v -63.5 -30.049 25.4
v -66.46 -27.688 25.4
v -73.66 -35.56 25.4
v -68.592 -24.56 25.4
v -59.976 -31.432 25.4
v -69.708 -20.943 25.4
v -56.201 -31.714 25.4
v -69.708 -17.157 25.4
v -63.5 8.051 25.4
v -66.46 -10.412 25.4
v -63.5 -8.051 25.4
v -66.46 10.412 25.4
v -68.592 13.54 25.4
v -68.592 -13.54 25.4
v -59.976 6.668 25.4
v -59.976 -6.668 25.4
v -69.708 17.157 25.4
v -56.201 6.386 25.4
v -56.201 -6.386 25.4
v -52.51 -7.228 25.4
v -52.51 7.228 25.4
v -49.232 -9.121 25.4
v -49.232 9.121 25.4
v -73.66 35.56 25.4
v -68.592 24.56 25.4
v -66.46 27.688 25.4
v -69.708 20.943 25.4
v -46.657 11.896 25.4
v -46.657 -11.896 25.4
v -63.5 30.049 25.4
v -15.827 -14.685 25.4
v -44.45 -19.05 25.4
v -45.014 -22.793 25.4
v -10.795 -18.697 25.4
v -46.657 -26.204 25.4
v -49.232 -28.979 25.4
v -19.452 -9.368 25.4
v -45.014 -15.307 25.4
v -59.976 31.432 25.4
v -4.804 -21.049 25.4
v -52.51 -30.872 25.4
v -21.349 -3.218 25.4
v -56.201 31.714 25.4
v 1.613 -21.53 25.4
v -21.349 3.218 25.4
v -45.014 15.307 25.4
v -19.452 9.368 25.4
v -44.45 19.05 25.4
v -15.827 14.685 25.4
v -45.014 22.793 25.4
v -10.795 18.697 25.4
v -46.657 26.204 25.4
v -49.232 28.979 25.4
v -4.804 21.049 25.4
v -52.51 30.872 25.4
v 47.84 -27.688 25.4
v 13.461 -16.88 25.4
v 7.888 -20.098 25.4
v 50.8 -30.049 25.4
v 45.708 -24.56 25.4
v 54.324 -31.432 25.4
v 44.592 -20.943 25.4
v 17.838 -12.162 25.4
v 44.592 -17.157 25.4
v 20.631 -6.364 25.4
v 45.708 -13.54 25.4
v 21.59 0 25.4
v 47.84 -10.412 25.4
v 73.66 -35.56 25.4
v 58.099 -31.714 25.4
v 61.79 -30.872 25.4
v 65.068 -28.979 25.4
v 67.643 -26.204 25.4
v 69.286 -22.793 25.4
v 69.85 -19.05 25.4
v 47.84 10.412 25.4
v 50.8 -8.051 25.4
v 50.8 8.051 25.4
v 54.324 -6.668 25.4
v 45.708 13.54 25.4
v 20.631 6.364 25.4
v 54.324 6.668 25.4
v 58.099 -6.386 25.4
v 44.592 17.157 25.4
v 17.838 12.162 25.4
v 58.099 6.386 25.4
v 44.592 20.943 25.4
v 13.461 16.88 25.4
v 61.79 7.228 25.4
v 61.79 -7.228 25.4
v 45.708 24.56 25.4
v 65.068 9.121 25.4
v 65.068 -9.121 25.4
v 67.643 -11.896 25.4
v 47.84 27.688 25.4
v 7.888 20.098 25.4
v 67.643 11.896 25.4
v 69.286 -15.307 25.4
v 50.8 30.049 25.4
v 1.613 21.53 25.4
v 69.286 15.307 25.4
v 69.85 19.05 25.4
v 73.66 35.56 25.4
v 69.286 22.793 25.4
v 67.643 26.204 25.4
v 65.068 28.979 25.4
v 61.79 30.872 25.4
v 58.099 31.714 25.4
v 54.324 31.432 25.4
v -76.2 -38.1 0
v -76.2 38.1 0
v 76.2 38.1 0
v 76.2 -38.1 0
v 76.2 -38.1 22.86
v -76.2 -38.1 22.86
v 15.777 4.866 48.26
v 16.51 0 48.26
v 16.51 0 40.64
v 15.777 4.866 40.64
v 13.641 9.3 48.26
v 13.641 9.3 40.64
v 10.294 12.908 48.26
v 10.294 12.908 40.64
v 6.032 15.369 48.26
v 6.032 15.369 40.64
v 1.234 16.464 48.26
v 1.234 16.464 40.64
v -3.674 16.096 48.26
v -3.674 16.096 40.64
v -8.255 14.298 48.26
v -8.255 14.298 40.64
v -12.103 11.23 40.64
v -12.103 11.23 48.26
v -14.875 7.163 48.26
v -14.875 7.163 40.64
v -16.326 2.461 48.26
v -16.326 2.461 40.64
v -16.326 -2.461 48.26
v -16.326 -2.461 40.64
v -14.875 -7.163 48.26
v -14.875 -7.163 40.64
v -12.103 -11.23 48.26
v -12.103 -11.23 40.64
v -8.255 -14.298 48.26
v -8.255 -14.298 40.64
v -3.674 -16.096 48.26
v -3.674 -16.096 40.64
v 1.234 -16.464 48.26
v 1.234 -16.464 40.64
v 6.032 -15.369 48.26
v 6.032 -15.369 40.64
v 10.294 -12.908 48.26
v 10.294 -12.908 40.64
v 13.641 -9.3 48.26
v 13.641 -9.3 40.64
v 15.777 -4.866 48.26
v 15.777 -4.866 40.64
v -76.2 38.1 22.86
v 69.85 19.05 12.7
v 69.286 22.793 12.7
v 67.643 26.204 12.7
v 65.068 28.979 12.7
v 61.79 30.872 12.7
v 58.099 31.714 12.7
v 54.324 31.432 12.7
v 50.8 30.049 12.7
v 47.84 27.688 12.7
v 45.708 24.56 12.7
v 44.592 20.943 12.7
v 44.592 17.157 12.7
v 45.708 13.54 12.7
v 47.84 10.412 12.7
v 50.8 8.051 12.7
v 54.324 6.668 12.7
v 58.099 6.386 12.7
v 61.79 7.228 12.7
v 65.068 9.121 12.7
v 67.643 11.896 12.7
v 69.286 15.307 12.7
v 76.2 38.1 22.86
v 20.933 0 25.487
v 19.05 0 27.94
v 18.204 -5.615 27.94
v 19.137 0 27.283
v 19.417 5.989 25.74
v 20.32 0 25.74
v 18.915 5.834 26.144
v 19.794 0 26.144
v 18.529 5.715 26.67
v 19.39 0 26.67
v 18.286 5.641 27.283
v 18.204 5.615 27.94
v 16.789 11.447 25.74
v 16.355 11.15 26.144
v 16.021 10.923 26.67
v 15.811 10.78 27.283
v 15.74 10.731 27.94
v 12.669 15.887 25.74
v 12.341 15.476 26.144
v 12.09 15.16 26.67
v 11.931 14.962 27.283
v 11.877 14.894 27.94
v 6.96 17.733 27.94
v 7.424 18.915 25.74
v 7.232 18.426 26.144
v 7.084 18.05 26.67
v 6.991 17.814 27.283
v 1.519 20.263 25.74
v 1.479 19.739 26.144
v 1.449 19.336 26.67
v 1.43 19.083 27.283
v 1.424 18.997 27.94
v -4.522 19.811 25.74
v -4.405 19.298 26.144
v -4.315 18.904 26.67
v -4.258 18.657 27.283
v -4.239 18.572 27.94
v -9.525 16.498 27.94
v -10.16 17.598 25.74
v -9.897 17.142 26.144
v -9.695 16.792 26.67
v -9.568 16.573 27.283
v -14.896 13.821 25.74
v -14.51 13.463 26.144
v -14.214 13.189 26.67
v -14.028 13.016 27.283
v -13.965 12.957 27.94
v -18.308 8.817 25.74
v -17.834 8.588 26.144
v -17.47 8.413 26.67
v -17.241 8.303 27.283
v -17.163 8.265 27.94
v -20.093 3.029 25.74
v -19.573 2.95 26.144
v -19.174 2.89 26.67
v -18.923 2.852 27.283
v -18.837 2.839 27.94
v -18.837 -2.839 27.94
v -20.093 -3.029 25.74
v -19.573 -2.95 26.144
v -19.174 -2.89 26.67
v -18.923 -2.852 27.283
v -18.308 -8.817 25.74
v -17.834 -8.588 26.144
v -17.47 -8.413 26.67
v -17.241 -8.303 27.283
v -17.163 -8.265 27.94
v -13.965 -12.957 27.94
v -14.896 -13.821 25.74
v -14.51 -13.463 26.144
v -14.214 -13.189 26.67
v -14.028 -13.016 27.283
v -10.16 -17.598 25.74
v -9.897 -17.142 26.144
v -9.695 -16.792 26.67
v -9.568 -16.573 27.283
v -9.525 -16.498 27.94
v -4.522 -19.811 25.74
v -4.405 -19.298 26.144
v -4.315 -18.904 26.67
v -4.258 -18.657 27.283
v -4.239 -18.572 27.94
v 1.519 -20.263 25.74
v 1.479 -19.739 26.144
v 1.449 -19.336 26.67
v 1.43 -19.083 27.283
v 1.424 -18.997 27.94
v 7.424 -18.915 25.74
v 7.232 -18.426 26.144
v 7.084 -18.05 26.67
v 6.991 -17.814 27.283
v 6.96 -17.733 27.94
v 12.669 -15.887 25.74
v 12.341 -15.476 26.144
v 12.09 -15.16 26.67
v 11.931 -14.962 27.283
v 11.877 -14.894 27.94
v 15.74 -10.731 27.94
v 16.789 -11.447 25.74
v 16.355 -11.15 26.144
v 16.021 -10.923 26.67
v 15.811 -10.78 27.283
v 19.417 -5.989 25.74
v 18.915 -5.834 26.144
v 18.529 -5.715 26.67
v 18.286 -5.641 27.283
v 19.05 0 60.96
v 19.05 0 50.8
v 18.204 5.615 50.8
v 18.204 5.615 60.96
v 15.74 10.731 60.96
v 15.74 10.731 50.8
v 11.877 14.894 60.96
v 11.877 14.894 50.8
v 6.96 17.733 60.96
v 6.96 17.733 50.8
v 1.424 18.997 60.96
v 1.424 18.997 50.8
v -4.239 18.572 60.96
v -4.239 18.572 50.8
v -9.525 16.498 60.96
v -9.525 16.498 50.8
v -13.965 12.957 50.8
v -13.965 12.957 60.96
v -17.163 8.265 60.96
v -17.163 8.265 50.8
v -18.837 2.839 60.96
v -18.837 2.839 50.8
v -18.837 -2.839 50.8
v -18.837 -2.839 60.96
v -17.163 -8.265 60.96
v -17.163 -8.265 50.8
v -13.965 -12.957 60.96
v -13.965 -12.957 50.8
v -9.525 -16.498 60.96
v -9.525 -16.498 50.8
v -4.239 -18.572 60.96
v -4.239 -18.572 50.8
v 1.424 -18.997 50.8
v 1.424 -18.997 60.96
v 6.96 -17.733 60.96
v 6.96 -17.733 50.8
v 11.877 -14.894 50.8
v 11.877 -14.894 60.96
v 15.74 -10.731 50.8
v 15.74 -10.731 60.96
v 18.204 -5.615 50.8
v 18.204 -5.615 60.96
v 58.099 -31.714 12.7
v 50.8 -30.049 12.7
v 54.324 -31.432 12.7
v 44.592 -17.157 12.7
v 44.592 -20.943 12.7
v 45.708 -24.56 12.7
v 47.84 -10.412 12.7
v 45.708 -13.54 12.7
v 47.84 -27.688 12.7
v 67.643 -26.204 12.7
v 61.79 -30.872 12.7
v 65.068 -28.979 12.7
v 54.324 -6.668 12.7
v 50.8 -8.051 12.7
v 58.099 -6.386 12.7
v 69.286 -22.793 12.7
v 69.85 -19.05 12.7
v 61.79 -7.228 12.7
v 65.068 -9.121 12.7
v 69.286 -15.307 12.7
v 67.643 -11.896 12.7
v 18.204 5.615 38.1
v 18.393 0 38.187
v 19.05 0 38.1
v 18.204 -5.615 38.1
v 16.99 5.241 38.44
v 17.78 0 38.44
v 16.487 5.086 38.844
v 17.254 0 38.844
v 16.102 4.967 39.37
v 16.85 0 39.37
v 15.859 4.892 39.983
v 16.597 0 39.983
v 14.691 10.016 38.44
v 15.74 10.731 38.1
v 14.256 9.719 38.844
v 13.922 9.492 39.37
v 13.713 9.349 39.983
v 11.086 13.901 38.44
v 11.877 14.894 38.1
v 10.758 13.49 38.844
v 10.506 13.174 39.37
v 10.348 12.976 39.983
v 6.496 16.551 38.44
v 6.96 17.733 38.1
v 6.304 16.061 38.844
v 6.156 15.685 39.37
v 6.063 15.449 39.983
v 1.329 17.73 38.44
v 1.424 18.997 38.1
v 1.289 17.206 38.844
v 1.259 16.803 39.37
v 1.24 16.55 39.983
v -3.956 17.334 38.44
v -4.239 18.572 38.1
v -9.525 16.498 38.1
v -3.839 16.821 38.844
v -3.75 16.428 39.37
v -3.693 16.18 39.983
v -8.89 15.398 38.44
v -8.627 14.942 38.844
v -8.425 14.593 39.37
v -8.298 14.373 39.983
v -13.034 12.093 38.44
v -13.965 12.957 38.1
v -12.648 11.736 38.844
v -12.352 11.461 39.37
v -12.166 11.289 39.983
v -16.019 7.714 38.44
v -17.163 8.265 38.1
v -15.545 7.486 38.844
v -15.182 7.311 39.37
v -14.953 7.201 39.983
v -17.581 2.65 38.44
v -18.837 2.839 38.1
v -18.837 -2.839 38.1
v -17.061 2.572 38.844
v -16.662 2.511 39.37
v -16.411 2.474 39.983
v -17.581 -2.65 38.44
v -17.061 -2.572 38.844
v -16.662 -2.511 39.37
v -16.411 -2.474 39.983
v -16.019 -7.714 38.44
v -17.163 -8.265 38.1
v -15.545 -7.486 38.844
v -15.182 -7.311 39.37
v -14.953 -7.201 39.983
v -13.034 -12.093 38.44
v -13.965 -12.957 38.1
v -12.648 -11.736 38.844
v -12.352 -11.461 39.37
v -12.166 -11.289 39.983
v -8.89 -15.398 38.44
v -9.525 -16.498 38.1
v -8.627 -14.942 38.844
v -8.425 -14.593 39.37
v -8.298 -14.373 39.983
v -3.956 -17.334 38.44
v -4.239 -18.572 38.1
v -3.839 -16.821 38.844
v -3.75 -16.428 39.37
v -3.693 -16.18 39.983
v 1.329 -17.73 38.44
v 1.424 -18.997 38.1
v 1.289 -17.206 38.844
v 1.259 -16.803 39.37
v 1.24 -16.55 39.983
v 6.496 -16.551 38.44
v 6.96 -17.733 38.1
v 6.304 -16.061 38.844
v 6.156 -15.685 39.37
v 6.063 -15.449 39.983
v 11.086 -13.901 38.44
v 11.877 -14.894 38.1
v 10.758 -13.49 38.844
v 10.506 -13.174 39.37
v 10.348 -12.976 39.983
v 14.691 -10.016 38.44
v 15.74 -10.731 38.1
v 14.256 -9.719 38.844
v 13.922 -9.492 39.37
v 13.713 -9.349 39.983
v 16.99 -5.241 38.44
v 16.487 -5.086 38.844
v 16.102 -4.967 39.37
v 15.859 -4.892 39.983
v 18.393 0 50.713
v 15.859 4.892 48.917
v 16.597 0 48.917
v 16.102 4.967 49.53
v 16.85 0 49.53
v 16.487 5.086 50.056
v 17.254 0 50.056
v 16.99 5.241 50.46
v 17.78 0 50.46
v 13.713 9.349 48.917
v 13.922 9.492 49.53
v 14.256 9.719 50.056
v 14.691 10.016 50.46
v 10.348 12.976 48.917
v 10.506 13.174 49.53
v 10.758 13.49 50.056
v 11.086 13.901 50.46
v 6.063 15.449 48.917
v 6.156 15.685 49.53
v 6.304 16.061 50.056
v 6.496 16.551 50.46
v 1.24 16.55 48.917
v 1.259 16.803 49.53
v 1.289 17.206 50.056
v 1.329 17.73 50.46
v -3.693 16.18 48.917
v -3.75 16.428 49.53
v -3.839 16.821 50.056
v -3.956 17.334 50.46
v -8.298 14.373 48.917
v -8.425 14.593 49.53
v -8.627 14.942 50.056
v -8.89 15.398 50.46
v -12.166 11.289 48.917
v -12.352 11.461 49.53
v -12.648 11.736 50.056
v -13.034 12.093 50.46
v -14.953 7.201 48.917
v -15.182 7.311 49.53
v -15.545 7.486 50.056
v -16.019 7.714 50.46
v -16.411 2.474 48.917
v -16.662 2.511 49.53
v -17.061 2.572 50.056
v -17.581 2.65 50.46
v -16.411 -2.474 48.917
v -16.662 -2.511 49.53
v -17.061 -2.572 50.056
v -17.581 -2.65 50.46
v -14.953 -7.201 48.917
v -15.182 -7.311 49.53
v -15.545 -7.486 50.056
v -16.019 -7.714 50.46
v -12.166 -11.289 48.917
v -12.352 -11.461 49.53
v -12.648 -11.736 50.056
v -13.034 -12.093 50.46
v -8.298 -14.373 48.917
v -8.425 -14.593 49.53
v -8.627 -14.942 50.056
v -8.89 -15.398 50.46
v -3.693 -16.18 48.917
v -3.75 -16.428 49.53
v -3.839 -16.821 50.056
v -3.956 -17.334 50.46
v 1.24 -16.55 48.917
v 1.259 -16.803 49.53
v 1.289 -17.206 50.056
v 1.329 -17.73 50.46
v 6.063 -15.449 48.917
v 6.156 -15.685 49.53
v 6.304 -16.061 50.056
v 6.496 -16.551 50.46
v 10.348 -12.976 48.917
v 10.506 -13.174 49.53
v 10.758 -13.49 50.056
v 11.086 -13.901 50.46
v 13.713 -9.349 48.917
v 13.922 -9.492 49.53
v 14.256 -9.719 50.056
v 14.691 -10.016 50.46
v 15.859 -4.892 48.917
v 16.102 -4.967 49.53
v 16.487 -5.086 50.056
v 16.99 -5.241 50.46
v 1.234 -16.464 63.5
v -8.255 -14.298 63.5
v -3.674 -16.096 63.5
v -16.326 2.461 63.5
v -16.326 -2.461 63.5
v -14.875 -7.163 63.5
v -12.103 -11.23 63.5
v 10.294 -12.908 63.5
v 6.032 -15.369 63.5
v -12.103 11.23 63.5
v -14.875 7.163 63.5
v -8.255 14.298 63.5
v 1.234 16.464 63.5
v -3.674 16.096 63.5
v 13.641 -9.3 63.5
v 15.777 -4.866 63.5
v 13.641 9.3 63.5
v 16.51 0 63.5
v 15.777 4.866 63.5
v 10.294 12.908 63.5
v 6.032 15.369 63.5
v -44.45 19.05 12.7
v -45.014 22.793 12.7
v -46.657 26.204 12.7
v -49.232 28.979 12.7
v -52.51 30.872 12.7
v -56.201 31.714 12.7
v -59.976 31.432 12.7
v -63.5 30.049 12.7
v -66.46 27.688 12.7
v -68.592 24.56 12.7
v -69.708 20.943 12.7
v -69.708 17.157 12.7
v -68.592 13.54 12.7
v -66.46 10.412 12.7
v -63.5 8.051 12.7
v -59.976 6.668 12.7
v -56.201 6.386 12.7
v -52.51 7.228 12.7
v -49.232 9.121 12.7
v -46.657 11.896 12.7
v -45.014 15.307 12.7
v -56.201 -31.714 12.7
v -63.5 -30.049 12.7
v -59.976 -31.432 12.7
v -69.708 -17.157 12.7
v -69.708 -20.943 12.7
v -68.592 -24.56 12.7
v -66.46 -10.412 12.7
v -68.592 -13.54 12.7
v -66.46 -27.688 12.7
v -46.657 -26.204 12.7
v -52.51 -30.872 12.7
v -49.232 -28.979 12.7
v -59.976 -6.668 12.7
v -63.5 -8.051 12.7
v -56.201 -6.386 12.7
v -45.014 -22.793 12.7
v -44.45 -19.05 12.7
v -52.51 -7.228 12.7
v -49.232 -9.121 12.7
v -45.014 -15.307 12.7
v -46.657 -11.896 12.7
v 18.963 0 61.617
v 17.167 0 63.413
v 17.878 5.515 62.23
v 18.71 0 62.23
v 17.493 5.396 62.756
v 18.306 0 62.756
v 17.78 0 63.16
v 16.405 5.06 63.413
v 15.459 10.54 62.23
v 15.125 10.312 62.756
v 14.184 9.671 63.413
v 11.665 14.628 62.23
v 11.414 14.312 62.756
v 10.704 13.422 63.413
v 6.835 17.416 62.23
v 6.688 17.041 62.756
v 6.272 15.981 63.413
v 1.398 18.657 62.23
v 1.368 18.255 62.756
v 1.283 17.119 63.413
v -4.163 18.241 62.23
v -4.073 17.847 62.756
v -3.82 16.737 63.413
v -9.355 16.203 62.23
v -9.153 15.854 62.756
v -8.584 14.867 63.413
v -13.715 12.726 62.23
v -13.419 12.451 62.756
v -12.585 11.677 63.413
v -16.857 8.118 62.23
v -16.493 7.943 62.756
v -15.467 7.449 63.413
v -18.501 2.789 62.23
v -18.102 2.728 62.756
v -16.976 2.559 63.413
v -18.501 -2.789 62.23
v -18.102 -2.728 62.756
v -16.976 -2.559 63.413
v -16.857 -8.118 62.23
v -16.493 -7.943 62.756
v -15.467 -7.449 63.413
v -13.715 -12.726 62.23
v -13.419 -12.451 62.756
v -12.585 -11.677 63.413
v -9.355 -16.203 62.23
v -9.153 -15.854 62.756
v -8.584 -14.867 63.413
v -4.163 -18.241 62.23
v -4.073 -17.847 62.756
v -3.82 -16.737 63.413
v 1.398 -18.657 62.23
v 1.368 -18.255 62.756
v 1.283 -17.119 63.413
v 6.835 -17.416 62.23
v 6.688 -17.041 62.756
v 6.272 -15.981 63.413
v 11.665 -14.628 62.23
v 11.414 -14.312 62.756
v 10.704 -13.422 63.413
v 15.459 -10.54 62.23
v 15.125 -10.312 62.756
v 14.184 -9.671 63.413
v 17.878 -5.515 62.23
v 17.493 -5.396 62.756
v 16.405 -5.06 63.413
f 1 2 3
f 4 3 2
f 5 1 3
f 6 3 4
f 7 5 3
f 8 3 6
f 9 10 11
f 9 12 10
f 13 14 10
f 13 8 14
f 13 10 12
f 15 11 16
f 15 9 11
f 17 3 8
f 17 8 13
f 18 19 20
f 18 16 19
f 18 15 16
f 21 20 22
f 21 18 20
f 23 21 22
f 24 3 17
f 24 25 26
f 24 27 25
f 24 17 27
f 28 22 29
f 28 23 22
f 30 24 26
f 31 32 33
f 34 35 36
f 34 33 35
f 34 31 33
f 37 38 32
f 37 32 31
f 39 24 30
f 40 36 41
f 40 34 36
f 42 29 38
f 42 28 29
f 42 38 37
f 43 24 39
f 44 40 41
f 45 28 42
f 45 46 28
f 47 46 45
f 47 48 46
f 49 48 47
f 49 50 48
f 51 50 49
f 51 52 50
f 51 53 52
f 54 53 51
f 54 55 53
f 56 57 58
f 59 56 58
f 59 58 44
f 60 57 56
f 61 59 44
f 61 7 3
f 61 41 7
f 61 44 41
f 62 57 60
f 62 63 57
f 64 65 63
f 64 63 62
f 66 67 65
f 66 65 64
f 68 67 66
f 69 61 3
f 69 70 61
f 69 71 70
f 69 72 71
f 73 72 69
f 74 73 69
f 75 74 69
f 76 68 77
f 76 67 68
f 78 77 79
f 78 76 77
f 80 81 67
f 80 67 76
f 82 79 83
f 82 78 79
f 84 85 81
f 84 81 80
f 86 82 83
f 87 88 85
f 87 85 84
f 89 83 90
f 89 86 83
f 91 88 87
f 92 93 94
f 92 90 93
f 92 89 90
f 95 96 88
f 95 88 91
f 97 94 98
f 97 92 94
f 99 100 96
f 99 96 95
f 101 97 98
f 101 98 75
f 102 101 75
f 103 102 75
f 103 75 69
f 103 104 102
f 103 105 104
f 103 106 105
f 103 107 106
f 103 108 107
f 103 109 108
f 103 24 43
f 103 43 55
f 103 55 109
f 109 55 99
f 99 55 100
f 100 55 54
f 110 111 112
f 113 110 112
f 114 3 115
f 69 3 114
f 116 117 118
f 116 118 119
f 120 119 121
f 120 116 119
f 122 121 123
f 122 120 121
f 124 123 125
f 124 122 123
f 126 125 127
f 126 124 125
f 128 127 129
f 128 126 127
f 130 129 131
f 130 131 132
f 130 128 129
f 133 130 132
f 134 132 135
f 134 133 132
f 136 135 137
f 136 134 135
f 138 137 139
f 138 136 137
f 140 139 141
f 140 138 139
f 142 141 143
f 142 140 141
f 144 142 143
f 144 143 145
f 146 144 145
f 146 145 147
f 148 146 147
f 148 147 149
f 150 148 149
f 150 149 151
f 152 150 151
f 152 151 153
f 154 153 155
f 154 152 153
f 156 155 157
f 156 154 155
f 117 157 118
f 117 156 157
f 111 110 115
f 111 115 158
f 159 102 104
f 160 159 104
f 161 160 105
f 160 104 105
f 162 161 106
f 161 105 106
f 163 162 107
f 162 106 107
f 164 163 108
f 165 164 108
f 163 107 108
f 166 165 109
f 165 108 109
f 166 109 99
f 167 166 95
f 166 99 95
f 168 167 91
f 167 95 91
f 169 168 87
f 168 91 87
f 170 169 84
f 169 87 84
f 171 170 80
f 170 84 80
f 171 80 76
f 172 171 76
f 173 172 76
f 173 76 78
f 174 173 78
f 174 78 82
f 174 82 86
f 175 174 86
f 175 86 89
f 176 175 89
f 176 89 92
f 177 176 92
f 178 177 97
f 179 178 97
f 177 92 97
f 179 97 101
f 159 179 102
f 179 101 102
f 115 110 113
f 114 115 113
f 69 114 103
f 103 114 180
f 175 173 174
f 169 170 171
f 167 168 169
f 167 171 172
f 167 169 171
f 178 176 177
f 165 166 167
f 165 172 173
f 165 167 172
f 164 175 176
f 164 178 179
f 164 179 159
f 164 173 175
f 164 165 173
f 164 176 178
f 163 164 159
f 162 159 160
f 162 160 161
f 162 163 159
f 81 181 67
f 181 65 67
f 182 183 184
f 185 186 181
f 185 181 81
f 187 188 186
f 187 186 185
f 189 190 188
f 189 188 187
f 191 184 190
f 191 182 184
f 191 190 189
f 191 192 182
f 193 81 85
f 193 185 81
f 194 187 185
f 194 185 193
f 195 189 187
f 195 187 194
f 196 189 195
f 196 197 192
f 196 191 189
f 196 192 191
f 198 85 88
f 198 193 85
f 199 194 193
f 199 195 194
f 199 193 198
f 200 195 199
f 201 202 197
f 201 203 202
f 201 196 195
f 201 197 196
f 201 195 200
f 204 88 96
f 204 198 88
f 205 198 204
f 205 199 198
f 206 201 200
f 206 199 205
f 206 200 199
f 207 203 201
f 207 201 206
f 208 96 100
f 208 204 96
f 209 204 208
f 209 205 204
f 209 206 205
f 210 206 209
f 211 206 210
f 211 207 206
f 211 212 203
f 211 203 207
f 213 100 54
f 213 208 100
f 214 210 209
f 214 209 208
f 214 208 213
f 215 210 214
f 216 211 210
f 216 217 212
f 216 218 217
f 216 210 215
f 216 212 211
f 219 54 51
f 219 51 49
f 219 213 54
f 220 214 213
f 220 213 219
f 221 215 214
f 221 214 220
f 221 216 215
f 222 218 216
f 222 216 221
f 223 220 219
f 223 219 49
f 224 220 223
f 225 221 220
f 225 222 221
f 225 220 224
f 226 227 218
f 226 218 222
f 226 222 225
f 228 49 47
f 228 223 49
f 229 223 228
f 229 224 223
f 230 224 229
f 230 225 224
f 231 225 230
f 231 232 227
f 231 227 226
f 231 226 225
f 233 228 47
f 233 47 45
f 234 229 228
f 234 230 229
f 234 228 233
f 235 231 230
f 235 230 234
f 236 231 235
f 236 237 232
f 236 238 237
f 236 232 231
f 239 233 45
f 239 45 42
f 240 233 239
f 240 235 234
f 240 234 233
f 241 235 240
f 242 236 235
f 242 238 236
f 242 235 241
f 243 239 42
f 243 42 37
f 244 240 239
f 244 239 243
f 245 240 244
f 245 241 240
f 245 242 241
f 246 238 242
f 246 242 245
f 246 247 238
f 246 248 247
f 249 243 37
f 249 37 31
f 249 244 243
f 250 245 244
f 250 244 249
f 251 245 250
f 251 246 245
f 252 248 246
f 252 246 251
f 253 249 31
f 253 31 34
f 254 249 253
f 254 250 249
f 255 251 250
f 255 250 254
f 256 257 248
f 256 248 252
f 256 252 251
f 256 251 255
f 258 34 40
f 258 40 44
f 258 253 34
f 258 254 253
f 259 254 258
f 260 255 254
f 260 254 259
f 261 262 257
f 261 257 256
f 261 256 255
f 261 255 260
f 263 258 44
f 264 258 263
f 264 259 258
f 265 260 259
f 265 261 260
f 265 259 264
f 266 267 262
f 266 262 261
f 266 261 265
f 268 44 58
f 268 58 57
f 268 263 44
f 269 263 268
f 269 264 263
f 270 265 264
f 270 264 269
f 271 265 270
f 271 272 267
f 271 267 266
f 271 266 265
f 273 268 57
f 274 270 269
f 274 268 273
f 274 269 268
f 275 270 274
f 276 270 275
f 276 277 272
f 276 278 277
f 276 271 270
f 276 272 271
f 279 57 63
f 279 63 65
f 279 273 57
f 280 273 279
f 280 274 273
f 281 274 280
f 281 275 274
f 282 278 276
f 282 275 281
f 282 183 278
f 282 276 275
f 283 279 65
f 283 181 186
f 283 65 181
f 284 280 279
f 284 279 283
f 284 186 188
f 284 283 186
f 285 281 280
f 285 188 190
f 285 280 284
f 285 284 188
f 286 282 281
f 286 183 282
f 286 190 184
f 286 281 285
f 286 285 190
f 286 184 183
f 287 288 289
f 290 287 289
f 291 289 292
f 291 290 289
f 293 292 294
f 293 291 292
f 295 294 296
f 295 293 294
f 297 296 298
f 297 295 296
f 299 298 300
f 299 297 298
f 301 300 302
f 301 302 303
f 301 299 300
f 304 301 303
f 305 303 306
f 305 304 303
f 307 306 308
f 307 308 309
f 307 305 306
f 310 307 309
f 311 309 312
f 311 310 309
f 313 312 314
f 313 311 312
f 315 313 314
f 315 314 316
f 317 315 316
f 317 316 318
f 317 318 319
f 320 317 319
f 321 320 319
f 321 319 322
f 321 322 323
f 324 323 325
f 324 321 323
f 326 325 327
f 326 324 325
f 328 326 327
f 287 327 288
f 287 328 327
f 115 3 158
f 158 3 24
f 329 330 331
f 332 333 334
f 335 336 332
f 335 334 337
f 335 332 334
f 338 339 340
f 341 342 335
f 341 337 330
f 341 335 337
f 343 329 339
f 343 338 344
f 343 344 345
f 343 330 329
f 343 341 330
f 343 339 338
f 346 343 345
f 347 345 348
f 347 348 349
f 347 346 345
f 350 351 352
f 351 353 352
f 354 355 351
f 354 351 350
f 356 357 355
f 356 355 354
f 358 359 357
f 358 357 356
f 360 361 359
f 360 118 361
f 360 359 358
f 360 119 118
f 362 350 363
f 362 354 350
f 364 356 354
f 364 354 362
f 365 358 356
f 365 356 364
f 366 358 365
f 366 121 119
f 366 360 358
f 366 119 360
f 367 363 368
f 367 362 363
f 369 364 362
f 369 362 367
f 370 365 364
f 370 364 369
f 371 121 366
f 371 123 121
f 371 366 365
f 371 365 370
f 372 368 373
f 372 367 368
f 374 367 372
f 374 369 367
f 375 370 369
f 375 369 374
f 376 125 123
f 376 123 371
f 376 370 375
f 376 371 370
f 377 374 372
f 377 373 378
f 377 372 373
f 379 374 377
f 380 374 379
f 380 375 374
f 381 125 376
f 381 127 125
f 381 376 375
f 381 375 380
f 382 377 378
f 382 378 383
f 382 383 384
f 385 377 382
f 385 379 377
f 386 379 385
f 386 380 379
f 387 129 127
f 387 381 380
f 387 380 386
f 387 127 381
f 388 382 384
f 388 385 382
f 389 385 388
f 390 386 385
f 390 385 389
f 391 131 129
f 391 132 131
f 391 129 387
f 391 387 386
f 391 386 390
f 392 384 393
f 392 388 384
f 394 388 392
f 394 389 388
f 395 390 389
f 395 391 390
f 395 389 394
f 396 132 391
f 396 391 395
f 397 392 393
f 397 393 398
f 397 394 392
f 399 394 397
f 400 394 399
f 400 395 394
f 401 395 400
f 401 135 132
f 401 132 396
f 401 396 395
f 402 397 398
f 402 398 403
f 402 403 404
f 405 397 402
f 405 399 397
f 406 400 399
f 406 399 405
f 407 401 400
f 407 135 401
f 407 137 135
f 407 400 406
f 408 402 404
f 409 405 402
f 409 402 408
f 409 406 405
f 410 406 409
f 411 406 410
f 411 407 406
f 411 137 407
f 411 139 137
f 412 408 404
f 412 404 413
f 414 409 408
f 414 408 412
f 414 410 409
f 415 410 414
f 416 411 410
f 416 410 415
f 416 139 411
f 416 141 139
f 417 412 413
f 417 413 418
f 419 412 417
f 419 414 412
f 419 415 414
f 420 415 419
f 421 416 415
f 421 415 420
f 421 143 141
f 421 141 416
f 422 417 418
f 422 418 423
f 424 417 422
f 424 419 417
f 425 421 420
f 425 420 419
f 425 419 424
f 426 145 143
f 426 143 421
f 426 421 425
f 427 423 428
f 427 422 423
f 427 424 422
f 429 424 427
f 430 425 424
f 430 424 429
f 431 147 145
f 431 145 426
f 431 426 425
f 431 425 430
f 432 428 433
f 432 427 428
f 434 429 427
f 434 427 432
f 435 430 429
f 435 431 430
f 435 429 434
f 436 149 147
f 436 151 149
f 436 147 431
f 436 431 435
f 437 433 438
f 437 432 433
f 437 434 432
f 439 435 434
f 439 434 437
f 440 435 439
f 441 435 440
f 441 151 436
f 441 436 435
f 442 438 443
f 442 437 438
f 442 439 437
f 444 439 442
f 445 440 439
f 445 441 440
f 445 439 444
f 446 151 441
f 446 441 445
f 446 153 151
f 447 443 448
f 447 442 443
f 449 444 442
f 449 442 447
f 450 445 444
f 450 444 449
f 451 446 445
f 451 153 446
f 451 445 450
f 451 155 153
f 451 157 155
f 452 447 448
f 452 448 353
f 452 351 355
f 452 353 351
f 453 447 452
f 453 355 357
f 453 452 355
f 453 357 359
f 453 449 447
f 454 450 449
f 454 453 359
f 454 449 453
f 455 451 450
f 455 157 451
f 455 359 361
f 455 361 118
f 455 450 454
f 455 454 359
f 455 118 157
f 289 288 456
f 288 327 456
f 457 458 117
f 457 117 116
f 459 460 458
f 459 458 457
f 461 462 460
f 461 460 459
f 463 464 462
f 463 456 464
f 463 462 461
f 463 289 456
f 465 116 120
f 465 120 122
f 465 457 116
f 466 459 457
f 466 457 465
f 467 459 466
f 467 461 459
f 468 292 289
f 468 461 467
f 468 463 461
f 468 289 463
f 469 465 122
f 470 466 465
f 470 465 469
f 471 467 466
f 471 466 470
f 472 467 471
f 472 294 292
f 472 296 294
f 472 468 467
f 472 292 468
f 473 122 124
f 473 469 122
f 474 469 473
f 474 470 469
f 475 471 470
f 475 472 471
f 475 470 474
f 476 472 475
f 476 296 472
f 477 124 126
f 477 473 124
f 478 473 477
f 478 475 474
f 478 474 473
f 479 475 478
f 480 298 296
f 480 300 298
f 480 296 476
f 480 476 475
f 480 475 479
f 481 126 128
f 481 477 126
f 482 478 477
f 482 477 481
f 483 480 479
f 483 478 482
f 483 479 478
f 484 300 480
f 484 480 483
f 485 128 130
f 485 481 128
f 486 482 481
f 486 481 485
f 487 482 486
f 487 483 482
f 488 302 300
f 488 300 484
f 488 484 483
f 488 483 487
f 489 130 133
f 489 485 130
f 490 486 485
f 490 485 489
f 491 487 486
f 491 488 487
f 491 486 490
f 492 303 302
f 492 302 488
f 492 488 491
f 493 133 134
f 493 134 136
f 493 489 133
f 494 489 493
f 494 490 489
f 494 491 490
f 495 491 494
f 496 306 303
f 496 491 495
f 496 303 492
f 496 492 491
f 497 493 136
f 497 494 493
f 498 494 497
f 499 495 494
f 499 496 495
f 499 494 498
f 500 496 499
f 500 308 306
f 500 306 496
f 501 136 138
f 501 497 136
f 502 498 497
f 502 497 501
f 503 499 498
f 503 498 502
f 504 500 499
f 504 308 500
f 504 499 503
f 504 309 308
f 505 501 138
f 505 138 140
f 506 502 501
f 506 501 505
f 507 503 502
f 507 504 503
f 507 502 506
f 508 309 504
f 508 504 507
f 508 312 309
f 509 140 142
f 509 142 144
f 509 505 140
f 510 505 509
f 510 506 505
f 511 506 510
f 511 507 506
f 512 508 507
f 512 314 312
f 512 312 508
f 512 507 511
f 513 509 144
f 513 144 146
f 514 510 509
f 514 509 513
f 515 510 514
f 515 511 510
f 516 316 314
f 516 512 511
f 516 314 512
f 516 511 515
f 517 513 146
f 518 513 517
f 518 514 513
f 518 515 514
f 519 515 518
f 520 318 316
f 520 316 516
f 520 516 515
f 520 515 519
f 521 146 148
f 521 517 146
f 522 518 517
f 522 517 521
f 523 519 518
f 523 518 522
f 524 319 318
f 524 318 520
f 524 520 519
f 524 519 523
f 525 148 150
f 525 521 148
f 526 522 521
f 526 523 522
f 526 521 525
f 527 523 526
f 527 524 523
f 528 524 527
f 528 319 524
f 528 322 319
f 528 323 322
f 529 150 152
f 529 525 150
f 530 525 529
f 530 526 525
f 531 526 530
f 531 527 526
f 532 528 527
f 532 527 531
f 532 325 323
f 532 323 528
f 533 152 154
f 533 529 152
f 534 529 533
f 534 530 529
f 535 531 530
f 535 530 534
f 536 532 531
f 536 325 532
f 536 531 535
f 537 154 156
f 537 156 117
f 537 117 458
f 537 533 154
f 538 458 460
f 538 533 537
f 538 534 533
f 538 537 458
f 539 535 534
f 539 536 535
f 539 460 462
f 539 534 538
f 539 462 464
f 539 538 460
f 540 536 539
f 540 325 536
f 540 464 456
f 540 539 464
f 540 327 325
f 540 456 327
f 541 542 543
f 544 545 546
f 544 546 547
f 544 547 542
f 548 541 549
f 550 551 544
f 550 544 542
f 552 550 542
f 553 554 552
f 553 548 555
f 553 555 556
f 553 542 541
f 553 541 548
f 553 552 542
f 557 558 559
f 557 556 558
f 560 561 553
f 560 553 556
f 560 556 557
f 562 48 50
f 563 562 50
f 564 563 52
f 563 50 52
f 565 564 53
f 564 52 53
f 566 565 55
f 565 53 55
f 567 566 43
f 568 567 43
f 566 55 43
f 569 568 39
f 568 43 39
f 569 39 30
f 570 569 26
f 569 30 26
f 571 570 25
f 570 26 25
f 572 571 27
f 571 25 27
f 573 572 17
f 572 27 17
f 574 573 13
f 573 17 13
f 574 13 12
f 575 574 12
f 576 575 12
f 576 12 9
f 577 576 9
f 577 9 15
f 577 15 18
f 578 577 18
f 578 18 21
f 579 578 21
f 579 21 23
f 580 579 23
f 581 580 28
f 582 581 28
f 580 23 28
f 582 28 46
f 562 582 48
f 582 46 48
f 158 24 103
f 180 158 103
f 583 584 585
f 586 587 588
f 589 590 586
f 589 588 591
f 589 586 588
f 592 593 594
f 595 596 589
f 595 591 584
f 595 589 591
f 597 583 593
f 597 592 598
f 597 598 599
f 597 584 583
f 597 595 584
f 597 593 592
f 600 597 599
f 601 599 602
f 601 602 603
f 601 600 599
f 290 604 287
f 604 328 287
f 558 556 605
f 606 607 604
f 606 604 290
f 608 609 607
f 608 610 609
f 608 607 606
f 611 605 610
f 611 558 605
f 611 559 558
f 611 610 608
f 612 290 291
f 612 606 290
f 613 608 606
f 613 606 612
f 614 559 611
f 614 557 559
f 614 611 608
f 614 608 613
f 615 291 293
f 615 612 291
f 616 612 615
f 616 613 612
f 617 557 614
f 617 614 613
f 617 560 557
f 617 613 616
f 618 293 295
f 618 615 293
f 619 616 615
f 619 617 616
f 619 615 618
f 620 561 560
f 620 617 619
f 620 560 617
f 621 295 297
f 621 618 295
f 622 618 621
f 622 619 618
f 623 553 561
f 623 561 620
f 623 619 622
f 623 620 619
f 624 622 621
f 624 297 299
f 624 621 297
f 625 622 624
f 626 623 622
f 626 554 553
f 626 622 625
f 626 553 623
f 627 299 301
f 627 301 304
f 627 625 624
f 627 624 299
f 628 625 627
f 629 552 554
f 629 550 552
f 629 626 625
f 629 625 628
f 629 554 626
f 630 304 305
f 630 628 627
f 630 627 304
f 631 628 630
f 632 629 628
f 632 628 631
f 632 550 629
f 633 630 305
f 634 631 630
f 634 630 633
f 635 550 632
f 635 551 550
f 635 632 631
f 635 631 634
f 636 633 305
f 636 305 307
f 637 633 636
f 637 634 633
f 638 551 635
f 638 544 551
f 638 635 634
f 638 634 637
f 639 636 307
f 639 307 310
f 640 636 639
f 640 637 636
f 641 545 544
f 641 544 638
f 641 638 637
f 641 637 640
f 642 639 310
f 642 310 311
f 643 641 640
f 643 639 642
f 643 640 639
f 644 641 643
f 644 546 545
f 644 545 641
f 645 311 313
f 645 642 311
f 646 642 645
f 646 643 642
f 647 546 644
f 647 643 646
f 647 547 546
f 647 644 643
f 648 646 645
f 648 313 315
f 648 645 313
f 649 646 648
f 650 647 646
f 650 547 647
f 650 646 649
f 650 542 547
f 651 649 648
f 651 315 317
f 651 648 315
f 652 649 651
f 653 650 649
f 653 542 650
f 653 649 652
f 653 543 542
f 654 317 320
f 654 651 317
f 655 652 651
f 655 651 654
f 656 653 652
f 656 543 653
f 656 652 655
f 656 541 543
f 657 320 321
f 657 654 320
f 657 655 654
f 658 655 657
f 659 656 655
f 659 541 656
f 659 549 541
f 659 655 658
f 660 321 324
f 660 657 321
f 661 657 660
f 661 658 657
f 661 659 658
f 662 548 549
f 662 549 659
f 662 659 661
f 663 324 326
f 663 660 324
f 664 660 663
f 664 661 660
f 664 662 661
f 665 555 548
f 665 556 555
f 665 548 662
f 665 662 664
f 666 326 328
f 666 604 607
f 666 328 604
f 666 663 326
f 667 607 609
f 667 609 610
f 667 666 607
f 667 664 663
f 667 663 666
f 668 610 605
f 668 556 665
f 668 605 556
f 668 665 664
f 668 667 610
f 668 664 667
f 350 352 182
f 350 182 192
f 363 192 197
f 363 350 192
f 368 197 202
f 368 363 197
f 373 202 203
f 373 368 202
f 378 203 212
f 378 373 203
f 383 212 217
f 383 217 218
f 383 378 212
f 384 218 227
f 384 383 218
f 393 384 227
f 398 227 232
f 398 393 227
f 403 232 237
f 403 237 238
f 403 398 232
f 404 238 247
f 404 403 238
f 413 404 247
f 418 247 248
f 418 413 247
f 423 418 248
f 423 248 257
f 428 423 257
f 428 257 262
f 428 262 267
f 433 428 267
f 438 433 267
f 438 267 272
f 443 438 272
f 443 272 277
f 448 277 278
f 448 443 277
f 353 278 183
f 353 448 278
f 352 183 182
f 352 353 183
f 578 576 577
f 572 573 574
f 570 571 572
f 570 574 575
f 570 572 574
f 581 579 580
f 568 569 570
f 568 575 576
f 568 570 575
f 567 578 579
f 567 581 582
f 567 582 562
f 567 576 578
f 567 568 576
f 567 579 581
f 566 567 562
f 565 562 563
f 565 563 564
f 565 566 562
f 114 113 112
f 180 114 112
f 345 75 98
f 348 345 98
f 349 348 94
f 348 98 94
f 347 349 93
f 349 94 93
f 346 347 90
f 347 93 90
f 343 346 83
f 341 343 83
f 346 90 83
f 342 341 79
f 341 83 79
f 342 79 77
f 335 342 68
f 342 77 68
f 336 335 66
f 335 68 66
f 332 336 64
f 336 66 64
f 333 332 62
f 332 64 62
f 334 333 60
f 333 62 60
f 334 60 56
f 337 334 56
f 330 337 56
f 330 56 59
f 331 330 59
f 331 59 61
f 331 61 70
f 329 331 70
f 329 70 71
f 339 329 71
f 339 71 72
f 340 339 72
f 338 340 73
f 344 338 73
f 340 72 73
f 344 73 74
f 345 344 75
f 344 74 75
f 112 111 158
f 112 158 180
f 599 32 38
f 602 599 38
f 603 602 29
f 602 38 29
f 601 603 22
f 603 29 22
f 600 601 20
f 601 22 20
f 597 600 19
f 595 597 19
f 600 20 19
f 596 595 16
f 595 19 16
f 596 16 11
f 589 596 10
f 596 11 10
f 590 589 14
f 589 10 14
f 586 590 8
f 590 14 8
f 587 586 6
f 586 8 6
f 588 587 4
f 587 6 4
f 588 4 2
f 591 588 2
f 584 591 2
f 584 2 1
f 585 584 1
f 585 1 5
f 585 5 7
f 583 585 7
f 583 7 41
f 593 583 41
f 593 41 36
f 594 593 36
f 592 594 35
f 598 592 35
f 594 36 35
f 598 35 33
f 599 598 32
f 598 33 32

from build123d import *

# Parameters (mm, degrees)
F0_W     = 152.4
F0_H     = 76.2
F1_DEPTH = 25.4
F2_R     = 12.7
F3_DEPTH = 12.7
F4_SIZE  = 2.54
F7_R     = 2.53999


# Not quite as in the source:
# - a fillet or chamfer is up to 0.001 mm smaller than in the source, because OpenCascade refuses the exact size


with BuildPart() as f1:
    # F0 (on Top) → F1 (new body)
    with BuildSketch(Plane.XY):
        Rectangle(F0_W, F0_H)
    extrude(amount=F1_DEPTH)

    # F2 (on face) → F3 (cut)
    with BuildSketch(Plane.XY.offset(25.4)):
        with Locations((57.15, -19.05)):
            Circle(F2_R)
        with Locations((-57.15, -19.05)):
            Circle(F2_R)
        with Locations((-57.15, 19.05)):
            Circle(F2_R)
        with Locations((57.15, 19.05)):
            Circle(F2_R)
    extrude(amount=-F3_DEPTH, mode=Mode.SUBTRACT)

    # F4
    f4_edges = [f1.edges().sort_by_distance(p)[0] for p in [
        (0, -38.1, 25.4),
        (76.2, 0, 25.4),
        (0, 38.1, 25.4),
        (-76.2, 0, 25.4),
    ]]
    chamfer(f4_edges, length=F4_SIZE)

    # F5 (on Front) → F6 (revolve)
    with BuildSketch(Plane.XZ):
        Polygon((0, 63.5), (0, 25.4), (19.05, 25.4), (19.05, 38.1), (16.51, 38.1), (16.51, 50.8), (19.05, 50.8), (19.05, 63.5), align=None)
    revolve(axis=Axis((0, 0, 44.45), (0, 0, 1)))

    # F7 (radius 2.54 in the source; OpenCascade refuses exactly that, so slightly less here)
    f7_edges = [f1.edges().sort_by_distance(p)[0] for p in [
        (-16.51, 0, 38.1),
        (-19.05, 0, 25.4),
        (-16.51, 0, 50.8),
        (-19.05, 0, 63.5),
    ]]
    fillet(f7_edges, radius=F7_R)


solid = f1.part
